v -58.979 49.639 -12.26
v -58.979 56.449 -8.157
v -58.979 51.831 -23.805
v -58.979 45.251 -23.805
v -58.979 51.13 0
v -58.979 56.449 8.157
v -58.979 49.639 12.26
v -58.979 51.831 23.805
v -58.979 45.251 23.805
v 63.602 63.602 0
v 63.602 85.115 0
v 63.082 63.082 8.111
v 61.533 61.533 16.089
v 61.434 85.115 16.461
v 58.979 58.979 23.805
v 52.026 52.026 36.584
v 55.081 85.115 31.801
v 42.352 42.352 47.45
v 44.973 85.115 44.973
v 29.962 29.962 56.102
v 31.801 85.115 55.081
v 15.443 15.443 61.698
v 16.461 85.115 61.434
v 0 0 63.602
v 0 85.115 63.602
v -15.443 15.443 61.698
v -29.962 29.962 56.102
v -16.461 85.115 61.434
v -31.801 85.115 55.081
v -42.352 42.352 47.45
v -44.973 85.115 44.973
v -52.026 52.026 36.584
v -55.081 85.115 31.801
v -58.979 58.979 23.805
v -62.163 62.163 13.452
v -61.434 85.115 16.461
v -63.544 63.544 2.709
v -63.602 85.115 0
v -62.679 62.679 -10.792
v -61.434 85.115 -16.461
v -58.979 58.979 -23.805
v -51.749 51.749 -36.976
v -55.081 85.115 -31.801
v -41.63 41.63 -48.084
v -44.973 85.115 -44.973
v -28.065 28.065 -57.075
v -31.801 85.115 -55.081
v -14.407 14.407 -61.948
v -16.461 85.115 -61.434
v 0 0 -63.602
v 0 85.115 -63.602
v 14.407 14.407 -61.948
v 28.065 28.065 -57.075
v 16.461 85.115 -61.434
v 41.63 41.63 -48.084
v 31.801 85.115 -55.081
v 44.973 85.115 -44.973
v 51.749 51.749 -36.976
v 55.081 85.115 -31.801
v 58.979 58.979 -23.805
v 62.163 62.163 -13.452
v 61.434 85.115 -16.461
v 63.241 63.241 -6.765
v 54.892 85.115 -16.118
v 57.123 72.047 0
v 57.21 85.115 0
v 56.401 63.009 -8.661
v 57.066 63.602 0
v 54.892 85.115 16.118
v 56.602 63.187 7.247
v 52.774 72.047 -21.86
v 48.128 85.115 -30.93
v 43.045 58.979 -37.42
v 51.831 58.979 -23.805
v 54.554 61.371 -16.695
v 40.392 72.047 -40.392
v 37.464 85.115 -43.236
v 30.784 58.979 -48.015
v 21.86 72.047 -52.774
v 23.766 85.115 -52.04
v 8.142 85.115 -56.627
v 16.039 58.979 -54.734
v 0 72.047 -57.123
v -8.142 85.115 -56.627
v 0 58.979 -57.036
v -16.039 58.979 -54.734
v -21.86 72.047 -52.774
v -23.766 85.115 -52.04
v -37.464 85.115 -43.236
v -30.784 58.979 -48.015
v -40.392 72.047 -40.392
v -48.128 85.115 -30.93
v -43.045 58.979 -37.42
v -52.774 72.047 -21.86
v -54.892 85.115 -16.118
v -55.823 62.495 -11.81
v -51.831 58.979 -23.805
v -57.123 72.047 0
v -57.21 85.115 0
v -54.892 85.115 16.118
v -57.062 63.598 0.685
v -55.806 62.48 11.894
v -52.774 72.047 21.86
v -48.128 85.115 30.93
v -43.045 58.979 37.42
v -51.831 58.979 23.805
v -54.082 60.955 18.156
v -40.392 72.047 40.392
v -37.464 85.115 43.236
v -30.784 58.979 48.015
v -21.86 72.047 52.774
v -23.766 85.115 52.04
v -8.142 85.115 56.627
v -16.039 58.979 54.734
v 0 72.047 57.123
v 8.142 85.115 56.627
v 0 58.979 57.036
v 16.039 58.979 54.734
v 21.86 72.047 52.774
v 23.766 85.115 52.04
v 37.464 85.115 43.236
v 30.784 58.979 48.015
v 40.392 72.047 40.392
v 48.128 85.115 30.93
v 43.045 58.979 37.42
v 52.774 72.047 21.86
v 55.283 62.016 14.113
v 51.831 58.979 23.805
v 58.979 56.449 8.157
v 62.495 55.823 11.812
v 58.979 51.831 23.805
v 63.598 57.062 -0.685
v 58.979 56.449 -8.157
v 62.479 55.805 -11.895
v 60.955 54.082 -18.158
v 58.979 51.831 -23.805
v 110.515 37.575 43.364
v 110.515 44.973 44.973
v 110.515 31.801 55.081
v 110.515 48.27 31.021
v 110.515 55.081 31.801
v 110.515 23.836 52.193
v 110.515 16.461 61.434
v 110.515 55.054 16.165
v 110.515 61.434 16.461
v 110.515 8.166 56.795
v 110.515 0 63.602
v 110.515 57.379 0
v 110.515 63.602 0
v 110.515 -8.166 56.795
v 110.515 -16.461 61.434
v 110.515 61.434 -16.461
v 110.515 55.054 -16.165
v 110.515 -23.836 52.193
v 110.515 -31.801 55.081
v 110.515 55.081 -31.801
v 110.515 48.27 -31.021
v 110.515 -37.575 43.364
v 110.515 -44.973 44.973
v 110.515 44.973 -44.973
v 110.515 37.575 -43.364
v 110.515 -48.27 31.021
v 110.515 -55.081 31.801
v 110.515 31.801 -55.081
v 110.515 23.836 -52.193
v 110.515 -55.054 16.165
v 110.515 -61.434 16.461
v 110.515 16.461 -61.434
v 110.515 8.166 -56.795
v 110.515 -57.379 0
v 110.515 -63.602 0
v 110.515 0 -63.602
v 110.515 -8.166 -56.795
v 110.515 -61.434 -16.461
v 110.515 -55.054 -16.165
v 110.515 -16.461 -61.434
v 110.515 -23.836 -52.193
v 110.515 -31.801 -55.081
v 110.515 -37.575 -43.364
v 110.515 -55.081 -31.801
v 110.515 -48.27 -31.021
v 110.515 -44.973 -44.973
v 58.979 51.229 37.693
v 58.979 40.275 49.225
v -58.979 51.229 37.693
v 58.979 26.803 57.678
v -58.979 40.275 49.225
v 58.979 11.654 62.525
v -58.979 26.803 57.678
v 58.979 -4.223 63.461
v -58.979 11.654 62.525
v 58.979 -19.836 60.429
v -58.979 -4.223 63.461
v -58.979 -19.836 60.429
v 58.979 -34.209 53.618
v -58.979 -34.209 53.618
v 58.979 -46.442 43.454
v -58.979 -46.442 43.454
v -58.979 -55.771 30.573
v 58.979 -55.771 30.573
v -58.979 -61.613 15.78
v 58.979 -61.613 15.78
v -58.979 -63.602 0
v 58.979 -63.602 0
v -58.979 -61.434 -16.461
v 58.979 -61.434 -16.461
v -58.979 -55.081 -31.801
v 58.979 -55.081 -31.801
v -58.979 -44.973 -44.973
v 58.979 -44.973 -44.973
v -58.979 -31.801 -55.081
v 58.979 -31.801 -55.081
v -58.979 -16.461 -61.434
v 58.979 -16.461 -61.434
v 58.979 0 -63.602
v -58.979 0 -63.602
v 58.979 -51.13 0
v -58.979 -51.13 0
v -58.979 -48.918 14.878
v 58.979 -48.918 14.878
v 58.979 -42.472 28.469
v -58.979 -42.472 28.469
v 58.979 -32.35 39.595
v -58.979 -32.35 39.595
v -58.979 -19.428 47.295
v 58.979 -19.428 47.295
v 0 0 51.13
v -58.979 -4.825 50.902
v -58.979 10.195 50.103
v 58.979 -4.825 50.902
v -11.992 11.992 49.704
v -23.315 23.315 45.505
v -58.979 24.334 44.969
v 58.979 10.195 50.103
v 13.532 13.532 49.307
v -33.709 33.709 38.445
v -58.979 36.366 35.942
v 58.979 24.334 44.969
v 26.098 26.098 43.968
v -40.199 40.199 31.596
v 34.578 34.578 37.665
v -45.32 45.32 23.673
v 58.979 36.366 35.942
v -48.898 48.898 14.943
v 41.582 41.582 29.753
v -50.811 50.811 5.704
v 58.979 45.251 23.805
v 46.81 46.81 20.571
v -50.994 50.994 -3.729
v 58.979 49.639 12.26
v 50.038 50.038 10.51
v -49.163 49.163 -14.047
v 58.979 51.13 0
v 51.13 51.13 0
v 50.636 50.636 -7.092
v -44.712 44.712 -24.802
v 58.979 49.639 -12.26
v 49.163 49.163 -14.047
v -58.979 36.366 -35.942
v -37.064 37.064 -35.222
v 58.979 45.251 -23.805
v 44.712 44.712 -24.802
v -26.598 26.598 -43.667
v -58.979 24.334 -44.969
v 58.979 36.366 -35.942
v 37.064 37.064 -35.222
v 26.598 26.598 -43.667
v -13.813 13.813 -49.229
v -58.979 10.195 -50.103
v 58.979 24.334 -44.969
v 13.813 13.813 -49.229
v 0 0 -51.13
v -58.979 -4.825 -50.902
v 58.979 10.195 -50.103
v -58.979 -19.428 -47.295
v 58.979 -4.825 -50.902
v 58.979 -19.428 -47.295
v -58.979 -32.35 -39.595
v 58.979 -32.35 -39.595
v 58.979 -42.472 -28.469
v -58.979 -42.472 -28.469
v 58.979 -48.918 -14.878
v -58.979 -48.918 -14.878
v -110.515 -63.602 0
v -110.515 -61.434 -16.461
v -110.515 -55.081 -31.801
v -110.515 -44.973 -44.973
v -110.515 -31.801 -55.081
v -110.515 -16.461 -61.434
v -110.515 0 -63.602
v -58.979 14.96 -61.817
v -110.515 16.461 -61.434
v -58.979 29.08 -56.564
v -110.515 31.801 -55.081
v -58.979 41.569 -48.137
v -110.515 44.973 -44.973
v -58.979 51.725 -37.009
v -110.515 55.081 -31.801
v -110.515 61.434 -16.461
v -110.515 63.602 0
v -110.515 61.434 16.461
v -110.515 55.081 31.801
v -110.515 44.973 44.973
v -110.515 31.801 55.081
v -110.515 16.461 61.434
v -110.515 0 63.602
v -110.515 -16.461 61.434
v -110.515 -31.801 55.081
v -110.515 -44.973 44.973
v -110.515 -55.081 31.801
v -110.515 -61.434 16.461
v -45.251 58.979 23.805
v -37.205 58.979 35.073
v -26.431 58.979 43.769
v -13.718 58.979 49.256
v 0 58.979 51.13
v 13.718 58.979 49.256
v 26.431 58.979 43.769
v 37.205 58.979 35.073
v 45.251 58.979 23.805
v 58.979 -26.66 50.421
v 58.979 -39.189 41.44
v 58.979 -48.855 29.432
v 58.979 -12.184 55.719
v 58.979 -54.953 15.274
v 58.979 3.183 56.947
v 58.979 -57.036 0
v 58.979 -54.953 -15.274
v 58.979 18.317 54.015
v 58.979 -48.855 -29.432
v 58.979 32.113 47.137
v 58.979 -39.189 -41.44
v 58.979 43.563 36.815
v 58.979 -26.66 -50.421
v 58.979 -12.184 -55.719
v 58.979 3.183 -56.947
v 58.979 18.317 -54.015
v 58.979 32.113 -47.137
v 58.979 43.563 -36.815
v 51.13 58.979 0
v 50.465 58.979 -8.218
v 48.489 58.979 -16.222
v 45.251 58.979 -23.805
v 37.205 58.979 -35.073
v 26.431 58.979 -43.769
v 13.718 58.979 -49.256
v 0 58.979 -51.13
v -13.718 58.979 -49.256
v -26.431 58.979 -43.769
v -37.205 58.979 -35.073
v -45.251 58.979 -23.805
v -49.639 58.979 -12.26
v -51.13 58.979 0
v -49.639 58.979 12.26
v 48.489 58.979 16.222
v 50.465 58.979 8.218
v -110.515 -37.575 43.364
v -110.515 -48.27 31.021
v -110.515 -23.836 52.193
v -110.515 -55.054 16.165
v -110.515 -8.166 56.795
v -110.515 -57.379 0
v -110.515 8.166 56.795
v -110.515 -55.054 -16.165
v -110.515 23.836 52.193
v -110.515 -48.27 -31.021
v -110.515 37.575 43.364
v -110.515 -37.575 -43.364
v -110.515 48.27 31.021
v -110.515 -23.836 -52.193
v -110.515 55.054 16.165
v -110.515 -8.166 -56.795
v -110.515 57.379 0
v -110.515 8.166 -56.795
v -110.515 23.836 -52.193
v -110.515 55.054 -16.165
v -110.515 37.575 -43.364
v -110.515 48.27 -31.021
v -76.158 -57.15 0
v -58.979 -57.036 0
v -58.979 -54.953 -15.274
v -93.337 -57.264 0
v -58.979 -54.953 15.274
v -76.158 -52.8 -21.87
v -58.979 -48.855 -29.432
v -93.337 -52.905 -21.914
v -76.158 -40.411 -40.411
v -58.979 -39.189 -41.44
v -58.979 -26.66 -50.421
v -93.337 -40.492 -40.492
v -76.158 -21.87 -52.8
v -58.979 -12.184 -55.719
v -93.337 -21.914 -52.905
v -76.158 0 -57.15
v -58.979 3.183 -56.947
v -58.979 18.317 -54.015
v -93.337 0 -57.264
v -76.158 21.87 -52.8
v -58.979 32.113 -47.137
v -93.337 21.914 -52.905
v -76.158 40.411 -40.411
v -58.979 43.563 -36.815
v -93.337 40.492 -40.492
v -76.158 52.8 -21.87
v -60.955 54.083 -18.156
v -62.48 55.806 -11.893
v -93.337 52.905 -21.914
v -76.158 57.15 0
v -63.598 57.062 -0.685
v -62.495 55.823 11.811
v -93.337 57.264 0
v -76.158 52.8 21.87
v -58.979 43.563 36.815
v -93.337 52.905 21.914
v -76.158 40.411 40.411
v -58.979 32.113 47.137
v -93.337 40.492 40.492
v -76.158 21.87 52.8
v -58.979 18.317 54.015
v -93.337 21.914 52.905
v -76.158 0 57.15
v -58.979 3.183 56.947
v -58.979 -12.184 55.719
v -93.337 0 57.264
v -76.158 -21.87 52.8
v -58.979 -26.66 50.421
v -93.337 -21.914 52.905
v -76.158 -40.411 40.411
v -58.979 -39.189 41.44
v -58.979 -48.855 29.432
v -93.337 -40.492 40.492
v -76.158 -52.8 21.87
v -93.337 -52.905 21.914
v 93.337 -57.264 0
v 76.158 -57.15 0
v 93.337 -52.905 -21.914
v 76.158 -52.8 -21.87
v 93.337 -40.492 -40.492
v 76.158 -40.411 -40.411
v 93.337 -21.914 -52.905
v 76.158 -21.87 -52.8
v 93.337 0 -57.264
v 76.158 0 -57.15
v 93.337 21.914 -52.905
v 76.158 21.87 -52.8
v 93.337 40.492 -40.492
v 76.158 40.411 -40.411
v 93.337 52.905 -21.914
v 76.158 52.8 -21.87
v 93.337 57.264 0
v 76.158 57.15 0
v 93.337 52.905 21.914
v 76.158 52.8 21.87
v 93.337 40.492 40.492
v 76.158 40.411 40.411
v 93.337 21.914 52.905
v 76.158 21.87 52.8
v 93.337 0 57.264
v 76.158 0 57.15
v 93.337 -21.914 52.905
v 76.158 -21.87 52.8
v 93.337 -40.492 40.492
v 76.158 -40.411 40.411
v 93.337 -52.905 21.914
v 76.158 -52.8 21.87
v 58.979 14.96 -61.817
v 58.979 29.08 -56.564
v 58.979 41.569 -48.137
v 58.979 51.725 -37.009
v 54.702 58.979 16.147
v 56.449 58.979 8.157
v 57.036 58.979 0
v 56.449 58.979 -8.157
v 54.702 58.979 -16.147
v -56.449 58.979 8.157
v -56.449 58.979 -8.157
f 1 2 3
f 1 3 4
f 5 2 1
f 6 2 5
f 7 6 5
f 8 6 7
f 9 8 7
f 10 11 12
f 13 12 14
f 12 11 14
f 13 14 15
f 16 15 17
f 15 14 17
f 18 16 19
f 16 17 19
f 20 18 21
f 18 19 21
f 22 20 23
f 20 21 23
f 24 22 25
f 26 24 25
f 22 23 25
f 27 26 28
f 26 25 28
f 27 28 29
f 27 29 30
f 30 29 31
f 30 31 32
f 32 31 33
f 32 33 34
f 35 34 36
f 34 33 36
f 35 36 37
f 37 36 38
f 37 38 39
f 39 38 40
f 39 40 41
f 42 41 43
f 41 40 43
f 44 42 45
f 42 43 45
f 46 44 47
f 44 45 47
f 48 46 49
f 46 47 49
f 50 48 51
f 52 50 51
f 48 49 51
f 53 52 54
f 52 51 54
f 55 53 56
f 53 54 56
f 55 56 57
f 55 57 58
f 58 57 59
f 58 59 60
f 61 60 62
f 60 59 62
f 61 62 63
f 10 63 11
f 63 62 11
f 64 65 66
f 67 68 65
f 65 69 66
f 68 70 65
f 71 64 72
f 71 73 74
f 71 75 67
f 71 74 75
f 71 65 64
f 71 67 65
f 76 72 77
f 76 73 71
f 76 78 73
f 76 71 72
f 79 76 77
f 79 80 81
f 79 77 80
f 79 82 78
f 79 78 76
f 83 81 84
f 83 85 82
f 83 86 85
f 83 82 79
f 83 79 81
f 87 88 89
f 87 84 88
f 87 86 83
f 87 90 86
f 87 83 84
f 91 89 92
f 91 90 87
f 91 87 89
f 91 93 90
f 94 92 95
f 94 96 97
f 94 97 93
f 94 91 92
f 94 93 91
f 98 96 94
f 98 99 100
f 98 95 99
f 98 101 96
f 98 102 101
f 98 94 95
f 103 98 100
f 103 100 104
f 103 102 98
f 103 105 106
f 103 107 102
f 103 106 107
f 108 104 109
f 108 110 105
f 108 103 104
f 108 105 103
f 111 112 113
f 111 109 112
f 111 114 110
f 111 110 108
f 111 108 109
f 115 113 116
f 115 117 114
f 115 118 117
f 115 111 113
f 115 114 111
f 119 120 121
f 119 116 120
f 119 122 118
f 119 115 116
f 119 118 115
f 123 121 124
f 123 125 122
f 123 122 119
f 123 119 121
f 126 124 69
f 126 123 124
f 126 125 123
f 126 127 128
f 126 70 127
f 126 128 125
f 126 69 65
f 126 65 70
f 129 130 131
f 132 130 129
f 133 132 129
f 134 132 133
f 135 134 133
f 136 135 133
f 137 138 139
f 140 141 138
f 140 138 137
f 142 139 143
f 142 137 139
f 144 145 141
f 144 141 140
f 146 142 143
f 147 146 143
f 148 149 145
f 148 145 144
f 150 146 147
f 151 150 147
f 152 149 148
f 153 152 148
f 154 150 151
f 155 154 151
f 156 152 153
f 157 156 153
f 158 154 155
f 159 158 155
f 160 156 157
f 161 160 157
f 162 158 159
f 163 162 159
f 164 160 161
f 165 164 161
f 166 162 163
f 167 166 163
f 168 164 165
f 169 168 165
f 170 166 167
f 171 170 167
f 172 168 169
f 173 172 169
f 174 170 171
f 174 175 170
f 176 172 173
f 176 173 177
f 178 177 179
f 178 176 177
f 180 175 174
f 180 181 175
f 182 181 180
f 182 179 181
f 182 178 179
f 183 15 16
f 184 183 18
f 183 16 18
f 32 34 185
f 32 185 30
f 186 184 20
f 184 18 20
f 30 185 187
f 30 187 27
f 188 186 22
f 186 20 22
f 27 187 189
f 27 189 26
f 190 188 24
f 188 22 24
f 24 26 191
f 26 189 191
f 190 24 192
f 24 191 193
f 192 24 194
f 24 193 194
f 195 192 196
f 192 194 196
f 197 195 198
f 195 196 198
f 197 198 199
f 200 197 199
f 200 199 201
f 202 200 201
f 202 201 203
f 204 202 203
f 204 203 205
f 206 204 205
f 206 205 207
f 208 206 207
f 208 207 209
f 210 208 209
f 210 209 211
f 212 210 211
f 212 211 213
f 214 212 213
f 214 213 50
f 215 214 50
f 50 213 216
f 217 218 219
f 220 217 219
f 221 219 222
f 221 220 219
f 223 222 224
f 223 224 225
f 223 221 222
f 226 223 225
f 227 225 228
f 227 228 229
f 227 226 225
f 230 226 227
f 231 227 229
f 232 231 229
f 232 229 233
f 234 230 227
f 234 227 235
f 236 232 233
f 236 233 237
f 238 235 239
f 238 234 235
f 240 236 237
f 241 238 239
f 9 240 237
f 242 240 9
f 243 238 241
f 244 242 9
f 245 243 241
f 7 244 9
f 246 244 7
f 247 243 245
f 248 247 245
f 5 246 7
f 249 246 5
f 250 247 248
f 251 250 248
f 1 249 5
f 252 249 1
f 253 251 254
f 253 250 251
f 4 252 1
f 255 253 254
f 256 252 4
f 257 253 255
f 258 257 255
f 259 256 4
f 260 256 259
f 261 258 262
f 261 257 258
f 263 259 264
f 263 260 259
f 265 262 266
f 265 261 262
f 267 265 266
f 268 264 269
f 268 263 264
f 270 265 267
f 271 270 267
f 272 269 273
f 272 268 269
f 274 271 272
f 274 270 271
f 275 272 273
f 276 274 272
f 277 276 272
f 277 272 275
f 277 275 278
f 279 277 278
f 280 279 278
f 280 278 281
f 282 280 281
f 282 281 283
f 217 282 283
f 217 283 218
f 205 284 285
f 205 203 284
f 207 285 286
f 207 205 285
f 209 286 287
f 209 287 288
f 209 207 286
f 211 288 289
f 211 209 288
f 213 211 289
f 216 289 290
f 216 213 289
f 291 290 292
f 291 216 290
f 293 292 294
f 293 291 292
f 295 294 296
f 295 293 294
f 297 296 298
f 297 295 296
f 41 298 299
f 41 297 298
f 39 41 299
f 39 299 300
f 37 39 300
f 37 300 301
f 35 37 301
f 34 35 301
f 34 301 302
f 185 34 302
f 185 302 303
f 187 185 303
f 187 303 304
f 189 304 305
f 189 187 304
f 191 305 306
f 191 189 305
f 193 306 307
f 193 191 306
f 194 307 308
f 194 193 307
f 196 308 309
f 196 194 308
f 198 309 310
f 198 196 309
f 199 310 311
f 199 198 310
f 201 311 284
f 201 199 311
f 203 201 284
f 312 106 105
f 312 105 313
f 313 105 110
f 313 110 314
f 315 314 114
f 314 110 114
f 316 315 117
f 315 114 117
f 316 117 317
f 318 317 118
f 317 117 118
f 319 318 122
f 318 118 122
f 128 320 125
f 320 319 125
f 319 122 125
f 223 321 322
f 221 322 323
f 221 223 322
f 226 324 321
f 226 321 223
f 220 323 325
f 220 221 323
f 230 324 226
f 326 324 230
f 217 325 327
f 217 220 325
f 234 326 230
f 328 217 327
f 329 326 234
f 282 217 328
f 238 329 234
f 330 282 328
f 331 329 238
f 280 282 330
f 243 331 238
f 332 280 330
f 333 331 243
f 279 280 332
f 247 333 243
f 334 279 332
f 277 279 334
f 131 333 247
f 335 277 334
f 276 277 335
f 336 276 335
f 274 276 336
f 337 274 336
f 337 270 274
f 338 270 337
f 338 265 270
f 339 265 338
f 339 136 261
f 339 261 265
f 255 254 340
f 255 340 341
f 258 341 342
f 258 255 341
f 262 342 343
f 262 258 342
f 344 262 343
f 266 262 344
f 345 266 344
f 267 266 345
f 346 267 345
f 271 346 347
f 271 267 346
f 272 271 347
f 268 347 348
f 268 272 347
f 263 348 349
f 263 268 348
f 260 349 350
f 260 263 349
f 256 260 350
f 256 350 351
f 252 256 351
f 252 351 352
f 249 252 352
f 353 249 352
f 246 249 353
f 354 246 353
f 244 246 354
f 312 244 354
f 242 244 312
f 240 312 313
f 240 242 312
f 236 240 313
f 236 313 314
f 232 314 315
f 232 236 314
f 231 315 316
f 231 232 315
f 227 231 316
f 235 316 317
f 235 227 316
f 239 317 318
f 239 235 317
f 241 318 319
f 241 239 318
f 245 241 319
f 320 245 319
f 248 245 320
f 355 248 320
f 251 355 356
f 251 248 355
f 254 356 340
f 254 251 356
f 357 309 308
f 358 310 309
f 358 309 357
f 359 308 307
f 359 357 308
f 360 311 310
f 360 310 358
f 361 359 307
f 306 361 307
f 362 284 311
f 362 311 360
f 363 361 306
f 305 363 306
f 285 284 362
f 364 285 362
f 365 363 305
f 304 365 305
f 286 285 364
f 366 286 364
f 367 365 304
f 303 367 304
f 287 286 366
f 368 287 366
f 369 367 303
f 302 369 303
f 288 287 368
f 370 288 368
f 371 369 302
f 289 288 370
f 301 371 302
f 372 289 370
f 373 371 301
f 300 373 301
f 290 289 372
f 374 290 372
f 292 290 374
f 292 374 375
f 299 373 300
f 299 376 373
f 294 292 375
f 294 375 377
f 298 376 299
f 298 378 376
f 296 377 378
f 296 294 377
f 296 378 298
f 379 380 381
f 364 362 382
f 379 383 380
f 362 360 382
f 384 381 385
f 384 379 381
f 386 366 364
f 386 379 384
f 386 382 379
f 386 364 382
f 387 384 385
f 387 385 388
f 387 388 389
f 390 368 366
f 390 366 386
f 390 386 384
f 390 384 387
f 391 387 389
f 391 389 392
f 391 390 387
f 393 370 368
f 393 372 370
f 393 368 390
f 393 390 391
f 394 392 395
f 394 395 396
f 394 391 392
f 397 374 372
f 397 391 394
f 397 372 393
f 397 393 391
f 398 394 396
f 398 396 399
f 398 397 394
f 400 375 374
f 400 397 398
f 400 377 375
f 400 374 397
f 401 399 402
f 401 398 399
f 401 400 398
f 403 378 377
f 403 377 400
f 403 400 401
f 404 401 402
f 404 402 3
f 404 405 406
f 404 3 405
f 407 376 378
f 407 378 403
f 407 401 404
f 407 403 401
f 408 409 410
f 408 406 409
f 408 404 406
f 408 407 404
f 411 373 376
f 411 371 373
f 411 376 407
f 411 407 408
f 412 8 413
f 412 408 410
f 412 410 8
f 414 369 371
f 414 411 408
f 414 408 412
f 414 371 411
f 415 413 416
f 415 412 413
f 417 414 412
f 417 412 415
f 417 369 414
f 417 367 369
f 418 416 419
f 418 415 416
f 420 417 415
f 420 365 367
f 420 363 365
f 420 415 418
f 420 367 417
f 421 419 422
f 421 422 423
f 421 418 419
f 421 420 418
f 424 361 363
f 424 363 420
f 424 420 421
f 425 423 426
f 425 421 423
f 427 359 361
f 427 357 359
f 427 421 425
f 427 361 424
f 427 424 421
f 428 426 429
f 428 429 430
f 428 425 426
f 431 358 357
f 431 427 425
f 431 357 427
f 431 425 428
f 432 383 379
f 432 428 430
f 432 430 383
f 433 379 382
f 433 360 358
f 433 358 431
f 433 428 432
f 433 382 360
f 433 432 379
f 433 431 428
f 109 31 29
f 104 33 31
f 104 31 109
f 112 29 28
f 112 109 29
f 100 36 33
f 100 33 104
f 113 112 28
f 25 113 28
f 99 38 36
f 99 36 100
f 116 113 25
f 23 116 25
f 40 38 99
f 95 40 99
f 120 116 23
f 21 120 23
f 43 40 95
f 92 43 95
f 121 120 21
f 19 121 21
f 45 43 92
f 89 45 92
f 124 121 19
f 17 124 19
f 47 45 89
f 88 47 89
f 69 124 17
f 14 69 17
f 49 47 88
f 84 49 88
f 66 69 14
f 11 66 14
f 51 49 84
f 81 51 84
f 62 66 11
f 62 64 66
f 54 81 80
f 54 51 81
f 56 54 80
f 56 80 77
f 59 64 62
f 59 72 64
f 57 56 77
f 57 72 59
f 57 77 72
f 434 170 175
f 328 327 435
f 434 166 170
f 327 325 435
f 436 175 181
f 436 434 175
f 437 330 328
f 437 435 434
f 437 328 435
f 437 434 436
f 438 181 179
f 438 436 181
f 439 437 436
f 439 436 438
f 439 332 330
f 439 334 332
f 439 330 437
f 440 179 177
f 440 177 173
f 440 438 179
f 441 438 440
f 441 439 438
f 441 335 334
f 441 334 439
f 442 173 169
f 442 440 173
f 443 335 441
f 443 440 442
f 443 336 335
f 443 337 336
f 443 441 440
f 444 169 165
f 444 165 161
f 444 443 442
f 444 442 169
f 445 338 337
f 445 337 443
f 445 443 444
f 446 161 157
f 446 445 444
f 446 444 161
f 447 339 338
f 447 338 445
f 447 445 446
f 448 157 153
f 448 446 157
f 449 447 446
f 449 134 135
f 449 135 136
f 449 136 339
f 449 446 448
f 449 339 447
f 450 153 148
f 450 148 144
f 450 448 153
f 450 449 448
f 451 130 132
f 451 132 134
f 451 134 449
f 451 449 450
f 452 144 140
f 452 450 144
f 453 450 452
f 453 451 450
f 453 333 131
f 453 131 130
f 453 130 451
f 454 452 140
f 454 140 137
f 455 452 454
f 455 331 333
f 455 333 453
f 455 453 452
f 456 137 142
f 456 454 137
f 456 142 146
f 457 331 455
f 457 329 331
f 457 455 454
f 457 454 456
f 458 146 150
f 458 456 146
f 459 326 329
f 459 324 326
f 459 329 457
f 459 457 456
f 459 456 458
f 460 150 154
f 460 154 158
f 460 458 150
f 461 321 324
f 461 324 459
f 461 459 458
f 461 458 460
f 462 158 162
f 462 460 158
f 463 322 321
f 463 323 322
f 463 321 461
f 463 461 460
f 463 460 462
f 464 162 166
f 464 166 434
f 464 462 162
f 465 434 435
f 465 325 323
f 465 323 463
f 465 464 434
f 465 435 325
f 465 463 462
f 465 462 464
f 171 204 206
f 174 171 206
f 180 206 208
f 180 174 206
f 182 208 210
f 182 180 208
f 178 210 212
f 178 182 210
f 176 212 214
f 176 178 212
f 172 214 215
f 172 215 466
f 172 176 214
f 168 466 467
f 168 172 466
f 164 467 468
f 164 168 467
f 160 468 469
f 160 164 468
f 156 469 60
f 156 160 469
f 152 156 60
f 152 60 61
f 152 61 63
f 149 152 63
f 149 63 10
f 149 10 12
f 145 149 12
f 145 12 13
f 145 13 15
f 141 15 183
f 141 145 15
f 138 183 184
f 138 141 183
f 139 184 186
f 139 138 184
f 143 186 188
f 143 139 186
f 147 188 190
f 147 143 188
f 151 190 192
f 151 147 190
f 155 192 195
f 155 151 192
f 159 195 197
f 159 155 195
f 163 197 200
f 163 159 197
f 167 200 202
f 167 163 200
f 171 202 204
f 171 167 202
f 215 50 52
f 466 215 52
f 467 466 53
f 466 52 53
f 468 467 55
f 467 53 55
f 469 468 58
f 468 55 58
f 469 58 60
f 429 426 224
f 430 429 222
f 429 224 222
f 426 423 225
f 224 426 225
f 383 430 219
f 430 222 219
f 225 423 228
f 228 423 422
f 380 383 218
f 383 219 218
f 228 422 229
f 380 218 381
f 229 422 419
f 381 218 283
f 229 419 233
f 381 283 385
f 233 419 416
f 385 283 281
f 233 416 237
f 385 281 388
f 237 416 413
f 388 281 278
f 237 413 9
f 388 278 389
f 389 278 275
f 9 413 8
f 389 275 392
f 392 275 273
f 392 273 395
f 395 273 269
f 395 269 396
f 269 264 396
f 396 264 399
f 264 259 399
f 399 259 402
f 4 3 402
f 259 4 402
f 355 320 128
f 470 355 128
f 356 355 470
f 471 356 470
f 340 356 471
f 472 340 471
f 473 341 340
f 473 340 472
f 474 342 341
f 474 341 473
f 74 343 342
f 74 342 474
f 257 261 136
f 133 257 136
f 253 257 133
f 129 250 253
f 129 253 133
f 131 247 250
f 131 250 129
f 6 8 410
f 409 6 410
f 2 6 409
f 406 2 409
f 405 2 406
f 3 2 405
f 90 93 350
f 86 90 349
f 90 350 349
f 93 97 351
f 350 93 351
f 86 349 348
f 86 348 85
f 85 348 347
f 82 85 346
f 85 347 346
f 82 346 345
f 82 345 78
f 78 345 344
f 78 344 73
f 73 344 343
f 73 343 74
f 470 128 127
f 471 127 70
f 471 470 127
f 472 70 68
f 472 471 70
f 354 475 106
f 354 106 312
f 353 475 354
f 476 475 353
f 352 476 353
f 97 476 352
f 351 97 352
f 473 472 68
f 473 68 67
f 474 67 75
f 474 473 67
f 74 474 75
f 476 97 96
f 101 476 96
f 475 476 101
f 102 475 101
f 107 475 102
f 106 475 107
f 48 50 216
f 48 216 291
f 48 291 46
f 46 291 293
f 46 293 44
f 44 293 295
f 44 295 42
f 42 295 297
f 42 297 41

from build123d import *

# Parameters (mm, degrees)
SKETCH4_R           = 63.6016
BOSS_EXTRUDE1_DEPTH = 117.9576
SKETCH5_R           = 63.6016
BOSS_EXTRUDE2_DEPTH = 58.9788
SKETCH8_R           = 92.190098926
SKETCH8_R_2         = 25.050168183
CUT_EXTRUDE1_DEPTH  = 25.4


with BuildPart() as part:
    # Sketch1 → Revolve1 (revolve)
    with BuildSketch(Plane.XY):
        Polygon((-110.5154, -63.6016), (-58.9788, -63.6016), (-58.9788, -57.0357), (-110.5154, -57.3786), align=None)
        Polygon((110.5154, -57.3786), (58.9788, -57.0357), (58.9788, -63.6016), (110.5154, -63.6016), align=None)
    revolve(axis=Axis((-110.5154, 0, 0), (1, 0, 0)))



with BuildPart() as body_2:
    # Sketch2 → Revolve2 (revolve)
    with BuildSketch(Plane.XY):
        Polygon((57.3786, 110.5154), (57.0357, 58.9788), (63.6016, 58.9788), (63.6016, 110.5154), align=None)
    revolve(axis=Axis((0, 0, 0), (0, 1, 0)))


with BuildPart() as part_1:
    add(part.part)

    add(body_2.part)  # Boss-Extrude1 merges body 2
    # Sketch4 → Boss-Extrude1 (add)
    with BuildSketch(Plane(origin=(-58.9788, 0, 0), x_dir=(0, 0, -1), z_dir=(1, 0, 0))):
        Circle(SKETCH4_R)
    extrude(amount=BOSS_EXTRUDE1_DEPTH)

    # Sketch5 → Boss-Extrude2 (add)
    with BuildSketch(Plane.XZ.offset(-58.9788)):
        Circle(SKETCH5_R)
    extrude(amount=BOSS_EXTRUDE2_DEPTH)

    # Sketch6 → Cut-Revolve1 (revolve, cut)
    with BuildSketch(Plane.XY):
        Polygon((-110.5154, -57.3786), (-58.9788, -57.0357), (-58.9788, -51.1302), (58.9788, -51.1302), (58.9788, -57.0357), (110.5154, -57.3786), (110.5154, 0), (-110.5154, 0), align=None)
    revolve(axis=Axis((110.5154, 0, 0), (-1, 0, 0)), mode=Mode.SUBTRACT)

    # Sketch7 → Cut-Revolve2 (revolve, cut)
    with BuildSketch(Plane.XY):
        Polygon((57.3786, 110.5154), (57.0357, 58.9788), (51.1302, 58.9788), (51.1302, 0), (0, 0), (0, 110.5154), align=None)
    revolve(axis=Axis((0, 0, 0), (0, 1, 0)), mode=Mode.SUBTRACT)

    # Sketch8 → Cut-Extrude1 (cut)
    with BuildSketch(Plane(origin=(0, 110.5154, 0), x_dir=(1, 0, 0), z_dir=(0, 1, 0))):
        Circle(SKETCH8_R)
        Circle(SKETCH8_R_2, mode=Mode.SUBTRACT)
    extrude(amount=-CUT_EXTRUDE1_DEPTH, mode=Mode.SUBTRACT)


solid = part_1.part
